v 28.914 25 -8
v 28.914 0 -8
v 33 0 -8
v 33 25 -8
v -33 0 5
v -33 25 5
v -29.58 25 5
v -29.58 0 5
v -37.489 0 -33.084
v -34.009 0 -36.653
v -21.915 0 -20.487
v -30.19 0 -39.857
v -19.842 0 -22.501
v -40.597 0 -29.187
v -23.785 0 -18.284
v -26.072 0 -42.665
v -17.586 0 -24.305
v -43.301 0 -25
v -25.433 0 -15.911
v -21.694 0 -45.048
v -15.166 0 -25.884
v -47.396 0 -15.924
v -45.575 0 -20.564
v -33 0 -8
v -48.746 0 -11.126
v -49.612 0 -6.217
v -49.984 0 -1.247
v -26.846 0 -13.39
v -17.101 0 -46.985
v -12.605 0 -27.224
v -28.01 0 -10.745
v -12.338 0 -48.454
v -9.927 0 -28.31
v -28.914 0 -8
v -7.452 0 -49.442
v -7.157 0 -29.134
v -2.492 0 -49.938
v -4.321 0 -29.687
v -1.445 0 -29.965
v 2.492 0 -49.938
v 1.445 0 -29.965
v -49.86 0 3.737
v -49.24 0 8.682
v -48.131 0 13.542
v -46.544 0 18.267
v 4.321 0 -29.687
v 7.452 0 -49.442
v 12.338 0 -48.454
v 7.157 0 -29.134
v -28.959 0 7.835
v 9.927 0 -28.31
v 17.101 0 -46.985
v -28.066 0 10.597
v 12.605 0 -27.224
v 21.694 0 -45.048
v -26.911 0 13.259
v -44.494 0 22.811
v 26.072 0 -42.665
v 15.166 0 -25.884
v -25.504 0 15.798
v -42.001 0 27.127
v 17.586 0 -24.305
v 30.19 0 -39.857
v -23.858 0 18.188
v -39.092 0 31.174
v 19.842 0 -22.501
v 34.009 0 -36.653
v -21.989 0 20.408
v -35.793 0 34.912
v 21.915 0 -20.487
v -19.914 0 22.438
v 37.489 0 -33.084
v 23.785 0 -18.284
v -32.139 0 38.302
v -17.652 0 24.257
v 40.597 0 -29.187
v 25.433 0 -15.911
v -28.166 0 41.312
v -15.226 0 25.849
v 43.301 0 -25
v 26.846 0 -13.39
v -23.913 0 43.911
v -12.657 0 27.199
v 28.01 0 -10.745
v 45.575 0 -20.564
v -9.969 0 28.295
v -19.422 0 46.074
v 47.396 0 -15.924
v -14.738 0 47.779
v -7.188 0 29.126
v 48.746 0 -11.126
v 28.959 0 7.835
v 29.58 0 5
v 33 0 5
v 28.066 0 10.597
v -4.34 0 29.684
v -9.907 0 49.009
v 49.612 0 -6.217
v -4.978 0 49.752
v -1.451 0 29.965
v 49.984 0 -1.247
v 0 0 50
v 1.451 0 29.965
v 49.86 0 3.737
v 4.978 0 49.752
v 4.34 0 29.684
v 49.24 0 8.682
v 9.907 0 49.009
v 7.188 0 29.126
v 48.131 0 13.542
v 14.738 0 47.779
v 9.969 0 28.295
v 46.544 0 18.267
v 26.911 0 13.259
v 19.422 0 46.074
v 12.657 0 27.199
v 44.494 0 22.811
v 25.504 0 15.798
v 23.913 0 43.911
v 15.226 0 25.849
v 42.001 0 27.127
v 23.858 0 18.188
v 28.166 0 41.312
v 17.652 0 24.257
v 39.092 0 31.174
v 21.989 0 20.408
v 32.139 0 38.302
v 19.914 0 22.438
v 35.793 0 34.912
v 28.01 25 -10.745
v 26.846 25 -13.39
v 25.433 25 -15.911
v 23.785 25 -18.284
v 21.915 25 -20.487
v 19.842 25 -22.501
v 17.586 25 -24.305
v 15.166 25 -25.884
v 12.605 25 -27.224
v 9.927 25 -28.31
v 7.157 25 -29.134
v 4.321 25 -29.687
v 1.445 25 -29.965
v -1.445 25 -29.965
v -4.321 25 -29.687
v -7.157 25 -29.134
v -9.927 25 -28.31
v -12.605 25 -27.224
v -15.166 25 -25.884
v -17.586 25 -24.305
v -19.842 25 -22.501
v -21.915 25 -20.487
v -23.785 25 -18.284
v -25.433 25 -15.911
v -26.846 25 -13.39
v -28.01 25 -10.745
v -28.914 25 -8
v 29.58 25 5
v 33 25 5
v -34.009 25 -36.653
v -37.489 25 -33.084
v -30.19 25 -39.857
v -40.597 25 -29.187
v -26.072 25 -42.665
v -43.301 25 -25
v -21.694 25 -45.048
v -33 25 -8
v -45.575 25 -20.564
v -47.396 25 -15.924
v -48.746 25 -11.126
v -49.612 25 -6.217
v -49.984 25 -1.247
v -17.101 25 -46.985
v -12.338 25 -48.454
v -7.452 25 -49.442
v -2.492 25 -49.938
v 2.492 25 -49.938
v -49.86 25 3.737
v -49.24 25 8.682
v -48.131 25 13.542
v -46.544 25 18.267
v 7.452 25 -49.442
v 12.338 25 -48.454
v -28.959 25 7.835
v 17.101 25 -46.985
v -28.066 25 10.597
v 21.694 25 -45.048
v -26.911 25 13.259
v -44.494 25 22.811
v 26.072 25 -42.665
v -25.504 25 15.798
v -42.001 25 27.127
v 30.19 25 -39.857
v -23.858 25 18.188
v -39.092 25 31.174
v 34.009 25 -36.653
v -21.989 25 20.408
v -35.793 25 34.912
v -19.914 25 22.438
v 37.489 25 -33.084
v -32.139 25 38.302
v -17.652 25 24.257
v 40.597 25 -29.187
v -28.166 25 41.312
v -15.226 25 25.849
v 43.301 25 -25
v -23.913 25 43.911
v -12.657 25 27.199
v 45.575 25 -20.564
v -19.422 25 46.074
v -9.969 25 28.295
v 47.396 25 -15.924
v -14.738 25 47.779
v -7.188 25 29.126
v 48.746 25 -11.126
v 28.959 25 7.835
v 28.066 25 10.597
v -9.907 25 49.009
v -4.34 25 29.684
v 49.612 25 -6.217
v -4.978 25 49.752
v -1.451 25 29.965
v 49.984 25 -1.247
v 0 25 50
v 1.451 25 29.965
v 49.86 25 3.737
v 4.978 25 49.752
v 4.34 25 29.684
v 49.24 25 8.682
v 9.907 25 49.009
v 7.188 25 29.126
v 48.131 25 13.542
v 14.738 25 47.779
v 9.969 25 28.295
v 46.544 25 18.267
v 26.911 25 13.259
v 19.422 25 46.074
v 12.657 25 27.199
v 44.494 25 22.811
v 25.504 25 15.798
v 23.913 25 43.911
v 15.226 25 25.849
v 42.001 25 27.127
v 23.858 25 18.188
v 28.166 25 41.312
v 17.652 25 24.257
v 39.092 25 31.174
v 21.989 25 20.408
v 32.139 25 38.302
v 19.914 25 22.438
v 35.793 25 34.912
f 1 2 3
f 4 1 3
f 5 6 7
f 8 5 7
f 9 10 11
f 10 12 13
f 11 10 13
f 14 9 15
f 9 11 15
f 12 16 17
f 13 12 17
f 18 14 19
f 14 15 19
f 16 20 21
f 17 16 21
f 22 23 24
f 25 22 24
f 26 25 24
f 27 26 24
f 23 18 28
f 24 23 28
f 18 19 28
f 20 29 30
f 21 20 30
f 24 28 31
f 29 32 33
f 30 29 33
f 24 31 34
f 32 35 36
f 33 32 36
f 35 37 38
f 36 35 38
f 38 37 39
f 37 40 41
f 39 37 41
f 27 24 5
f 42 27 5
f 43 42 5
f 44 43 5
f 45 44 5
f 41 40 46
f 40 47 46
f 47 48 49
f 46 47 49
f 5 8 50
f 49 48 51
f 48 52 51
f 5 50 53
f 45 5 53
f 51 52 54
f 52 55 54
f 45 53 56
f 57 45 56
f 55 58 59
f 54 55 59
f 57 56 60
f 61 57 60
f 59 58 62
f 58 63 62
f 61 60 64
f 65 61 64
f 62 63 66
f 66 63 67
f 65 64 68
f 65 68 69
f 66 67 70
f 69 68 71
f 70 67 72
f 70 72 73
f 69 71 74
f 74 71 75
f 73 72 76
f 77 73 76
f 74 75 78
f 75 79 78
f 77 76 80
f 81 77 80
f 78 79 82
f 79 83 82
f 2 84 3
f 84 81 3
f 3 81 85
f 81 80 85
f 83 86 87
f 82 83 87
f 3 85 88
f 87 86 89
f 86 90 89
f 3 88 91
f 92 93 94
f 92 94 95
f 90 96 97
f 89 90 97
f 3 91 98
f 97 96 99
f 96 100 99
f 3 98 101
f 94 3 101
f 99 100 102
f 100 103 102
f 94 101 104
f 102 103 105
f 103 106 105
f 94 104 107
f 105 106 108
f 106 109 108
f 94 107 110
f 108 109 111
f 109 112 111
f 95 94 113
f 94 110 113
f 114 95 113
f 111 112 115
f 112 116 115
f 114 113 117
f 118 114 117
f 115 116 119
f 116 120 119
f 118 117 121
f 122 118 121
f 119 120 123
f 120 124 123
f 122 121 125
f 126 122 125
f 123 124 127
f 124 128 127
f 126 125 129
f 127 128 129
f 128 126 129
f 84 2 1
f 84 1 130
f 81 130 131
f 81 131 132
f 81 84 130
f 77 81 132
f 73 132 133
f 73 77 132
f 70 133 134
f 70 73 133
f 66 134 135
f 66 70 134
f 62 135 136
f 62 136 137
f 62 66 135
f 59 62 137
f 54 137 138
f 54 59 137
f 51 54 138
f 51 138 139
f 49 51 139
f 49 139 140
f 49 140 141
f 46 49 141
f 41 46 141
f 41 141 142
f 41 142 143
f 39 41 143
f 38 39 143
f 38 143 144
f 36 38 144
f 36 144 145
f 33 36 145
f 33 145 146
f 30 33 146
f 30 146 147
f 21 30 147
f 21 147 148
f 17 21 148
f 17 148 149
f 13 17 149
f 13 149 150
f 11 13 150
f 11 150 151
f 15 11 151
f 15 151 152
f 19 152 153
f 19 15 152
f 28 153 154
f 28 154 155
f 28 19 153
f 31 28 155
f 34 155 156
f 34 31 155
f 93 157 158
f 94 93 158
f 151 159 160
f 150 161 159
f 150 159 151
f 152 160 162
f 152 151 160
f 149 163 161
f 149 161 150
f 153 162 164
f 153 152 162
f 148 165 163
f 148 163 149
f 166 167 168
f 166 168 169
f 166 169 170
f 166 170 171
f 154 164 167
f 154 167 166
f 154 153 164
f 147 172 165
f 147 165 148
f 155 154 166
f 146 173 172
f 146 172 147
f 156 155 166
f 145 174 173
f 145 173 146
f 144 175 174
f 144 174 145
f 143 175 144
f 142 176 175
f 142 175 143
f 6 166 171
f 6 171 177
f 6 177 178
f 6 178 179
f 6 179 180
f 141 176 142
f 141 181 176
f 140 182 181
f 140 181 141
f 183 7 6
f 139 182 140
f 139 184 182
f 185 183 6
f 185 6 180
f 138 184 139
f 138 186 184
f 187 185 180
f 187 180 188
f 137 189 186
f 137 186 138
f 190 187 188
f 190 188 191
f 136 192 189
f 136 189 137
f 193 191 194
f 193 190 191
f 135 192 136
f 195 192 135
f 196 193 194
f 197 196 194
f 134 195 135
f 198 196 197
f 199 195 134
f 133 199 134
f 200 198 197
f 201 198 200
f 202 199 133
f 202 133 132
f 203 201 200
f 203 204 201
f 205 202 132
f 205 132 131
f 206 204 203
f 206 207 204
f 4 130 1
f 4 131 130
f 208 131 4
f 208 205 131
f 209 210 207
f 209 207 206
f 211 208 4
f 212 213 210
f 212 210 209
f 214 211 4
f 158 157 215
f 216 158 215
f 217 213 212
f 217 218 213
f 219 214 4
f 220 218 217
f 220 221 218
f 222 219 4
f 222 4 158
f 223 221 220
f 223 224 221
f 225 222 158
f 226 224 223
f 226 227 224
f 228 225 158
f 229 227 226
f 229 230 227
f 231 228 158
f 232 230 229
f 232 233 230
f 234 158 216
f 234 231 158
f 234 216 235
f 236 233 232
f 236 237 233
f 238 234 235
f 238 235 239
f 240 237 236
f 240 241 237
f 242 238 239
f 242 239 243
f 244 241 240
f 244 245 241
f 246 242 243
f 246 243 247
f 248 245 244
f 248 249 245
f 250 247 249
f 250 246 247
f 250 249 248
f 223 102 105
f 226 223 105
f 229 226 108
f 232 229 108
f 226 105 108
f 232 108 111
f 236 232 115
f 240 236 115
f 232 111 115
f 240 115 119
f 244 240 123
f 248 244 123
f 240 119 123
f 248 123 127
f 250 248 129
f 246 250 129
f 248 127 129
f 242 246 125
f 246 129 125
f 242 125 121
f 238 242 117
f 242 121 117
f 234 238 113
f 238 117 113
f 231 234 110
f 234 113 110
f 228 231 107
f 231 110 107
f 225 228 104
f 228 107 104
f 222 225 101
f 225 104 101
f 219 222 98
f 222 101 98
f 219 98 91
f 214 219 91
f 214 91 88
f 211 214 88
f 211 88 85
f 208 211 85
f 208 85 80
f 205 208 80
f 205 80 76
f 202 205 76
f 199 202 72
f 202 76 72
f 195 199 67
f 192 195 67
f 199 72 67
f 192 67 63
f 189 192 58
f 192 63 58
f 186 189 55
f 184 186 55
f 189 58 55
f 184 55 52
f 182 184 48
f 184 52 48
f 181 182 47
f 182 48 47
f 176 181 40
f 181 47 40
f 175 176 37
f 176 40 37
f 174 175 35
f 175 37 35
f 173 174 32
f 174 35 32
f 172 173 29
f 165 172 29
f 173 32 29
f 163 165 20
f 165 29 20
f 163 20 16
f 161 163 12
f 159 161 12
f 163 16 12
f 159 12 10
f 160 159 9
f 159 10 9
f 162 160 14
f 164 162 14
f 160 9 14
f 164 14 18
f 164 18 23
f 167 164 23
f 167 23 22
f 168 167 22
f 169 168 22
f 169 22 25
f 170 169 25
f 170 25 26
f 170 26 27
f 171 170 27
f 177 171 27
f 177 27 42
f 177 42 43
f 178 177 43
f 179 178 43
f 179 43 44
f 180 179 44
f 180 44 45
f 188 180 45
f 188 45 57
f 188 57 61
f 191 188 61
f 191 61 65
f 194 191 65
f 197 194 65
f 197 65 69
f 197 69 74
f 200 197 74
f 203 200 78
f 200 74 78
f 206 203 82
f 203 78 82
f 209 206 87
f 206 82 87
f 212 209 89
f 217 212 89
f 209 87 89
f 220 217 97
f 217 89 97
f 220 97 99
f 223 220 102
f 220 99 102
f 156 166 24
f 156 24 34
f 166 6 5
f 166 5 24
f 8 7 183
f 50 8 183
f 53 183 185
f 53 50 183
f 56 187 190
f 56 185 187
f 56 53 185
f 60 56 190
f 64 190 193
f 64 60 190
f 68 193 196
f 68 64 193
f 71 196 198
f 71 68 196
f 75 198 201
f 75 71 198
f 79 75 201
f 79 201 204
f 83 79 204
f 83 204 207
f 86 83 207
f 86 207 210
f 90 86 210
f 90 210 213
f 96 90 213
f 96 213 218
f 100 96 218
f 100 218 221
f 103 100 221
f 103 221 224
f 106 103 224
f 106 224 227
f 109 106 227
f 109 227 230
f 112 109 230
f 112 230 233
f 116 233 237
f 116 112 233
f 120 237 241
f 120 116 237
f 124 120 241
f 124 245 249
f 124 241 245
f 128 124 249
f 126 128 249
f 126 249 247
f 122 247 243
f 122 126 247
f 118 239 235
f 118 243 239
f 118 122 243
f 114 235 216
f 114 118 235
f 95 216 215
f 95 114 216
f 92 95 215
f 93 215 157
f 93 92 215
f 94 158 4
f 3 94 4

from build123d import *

# Parameters (mm, degrees)
SKETCH2_R           = 50
SKETCH2_R_2         = 30
BOSS_EXTRUDE1_DEPTH = 25
SKETCH3_W           = 66
SKETCH3_H           = 13
CUT_EXTRUDE1_DEPTH  = 25


with BuildPart() as part:
    # Sketch2 → Boss-Extrude1 (new body)
    with BuildSketch(Plane(origin=(0, 0, 0), x_dir=(1, 0, 0), z_dir=(0, 1, 0))):
        with Locations(Location((0, 0, 0), (0, 0, 270))):
            Circle(SKETCH2_R)
        with Locations(Location((0, 0, 0), (0, 0, 270))):
            Circle(SKETCH2_R_2, mode=Mode.SUBTRACT)
    extrude(amount=BOSS_EXTRUDE1_DEPTH)

    # Sketch3 → Cut-Extrude1 (cut)
    with BuildSketch(Plane(origin=(0, 25, 0), x_dir=(1, 0, 0), z_dir=(0, 1, 0))):
        with Locations((0, 1.5)):
            Rectangle(SKETCH3_W, SKETCH3_H)
    extrude(amount=-CUT_EXTRUDE1_DEPTH, mode=Mode.SUBTRACT)


solid = part.part
